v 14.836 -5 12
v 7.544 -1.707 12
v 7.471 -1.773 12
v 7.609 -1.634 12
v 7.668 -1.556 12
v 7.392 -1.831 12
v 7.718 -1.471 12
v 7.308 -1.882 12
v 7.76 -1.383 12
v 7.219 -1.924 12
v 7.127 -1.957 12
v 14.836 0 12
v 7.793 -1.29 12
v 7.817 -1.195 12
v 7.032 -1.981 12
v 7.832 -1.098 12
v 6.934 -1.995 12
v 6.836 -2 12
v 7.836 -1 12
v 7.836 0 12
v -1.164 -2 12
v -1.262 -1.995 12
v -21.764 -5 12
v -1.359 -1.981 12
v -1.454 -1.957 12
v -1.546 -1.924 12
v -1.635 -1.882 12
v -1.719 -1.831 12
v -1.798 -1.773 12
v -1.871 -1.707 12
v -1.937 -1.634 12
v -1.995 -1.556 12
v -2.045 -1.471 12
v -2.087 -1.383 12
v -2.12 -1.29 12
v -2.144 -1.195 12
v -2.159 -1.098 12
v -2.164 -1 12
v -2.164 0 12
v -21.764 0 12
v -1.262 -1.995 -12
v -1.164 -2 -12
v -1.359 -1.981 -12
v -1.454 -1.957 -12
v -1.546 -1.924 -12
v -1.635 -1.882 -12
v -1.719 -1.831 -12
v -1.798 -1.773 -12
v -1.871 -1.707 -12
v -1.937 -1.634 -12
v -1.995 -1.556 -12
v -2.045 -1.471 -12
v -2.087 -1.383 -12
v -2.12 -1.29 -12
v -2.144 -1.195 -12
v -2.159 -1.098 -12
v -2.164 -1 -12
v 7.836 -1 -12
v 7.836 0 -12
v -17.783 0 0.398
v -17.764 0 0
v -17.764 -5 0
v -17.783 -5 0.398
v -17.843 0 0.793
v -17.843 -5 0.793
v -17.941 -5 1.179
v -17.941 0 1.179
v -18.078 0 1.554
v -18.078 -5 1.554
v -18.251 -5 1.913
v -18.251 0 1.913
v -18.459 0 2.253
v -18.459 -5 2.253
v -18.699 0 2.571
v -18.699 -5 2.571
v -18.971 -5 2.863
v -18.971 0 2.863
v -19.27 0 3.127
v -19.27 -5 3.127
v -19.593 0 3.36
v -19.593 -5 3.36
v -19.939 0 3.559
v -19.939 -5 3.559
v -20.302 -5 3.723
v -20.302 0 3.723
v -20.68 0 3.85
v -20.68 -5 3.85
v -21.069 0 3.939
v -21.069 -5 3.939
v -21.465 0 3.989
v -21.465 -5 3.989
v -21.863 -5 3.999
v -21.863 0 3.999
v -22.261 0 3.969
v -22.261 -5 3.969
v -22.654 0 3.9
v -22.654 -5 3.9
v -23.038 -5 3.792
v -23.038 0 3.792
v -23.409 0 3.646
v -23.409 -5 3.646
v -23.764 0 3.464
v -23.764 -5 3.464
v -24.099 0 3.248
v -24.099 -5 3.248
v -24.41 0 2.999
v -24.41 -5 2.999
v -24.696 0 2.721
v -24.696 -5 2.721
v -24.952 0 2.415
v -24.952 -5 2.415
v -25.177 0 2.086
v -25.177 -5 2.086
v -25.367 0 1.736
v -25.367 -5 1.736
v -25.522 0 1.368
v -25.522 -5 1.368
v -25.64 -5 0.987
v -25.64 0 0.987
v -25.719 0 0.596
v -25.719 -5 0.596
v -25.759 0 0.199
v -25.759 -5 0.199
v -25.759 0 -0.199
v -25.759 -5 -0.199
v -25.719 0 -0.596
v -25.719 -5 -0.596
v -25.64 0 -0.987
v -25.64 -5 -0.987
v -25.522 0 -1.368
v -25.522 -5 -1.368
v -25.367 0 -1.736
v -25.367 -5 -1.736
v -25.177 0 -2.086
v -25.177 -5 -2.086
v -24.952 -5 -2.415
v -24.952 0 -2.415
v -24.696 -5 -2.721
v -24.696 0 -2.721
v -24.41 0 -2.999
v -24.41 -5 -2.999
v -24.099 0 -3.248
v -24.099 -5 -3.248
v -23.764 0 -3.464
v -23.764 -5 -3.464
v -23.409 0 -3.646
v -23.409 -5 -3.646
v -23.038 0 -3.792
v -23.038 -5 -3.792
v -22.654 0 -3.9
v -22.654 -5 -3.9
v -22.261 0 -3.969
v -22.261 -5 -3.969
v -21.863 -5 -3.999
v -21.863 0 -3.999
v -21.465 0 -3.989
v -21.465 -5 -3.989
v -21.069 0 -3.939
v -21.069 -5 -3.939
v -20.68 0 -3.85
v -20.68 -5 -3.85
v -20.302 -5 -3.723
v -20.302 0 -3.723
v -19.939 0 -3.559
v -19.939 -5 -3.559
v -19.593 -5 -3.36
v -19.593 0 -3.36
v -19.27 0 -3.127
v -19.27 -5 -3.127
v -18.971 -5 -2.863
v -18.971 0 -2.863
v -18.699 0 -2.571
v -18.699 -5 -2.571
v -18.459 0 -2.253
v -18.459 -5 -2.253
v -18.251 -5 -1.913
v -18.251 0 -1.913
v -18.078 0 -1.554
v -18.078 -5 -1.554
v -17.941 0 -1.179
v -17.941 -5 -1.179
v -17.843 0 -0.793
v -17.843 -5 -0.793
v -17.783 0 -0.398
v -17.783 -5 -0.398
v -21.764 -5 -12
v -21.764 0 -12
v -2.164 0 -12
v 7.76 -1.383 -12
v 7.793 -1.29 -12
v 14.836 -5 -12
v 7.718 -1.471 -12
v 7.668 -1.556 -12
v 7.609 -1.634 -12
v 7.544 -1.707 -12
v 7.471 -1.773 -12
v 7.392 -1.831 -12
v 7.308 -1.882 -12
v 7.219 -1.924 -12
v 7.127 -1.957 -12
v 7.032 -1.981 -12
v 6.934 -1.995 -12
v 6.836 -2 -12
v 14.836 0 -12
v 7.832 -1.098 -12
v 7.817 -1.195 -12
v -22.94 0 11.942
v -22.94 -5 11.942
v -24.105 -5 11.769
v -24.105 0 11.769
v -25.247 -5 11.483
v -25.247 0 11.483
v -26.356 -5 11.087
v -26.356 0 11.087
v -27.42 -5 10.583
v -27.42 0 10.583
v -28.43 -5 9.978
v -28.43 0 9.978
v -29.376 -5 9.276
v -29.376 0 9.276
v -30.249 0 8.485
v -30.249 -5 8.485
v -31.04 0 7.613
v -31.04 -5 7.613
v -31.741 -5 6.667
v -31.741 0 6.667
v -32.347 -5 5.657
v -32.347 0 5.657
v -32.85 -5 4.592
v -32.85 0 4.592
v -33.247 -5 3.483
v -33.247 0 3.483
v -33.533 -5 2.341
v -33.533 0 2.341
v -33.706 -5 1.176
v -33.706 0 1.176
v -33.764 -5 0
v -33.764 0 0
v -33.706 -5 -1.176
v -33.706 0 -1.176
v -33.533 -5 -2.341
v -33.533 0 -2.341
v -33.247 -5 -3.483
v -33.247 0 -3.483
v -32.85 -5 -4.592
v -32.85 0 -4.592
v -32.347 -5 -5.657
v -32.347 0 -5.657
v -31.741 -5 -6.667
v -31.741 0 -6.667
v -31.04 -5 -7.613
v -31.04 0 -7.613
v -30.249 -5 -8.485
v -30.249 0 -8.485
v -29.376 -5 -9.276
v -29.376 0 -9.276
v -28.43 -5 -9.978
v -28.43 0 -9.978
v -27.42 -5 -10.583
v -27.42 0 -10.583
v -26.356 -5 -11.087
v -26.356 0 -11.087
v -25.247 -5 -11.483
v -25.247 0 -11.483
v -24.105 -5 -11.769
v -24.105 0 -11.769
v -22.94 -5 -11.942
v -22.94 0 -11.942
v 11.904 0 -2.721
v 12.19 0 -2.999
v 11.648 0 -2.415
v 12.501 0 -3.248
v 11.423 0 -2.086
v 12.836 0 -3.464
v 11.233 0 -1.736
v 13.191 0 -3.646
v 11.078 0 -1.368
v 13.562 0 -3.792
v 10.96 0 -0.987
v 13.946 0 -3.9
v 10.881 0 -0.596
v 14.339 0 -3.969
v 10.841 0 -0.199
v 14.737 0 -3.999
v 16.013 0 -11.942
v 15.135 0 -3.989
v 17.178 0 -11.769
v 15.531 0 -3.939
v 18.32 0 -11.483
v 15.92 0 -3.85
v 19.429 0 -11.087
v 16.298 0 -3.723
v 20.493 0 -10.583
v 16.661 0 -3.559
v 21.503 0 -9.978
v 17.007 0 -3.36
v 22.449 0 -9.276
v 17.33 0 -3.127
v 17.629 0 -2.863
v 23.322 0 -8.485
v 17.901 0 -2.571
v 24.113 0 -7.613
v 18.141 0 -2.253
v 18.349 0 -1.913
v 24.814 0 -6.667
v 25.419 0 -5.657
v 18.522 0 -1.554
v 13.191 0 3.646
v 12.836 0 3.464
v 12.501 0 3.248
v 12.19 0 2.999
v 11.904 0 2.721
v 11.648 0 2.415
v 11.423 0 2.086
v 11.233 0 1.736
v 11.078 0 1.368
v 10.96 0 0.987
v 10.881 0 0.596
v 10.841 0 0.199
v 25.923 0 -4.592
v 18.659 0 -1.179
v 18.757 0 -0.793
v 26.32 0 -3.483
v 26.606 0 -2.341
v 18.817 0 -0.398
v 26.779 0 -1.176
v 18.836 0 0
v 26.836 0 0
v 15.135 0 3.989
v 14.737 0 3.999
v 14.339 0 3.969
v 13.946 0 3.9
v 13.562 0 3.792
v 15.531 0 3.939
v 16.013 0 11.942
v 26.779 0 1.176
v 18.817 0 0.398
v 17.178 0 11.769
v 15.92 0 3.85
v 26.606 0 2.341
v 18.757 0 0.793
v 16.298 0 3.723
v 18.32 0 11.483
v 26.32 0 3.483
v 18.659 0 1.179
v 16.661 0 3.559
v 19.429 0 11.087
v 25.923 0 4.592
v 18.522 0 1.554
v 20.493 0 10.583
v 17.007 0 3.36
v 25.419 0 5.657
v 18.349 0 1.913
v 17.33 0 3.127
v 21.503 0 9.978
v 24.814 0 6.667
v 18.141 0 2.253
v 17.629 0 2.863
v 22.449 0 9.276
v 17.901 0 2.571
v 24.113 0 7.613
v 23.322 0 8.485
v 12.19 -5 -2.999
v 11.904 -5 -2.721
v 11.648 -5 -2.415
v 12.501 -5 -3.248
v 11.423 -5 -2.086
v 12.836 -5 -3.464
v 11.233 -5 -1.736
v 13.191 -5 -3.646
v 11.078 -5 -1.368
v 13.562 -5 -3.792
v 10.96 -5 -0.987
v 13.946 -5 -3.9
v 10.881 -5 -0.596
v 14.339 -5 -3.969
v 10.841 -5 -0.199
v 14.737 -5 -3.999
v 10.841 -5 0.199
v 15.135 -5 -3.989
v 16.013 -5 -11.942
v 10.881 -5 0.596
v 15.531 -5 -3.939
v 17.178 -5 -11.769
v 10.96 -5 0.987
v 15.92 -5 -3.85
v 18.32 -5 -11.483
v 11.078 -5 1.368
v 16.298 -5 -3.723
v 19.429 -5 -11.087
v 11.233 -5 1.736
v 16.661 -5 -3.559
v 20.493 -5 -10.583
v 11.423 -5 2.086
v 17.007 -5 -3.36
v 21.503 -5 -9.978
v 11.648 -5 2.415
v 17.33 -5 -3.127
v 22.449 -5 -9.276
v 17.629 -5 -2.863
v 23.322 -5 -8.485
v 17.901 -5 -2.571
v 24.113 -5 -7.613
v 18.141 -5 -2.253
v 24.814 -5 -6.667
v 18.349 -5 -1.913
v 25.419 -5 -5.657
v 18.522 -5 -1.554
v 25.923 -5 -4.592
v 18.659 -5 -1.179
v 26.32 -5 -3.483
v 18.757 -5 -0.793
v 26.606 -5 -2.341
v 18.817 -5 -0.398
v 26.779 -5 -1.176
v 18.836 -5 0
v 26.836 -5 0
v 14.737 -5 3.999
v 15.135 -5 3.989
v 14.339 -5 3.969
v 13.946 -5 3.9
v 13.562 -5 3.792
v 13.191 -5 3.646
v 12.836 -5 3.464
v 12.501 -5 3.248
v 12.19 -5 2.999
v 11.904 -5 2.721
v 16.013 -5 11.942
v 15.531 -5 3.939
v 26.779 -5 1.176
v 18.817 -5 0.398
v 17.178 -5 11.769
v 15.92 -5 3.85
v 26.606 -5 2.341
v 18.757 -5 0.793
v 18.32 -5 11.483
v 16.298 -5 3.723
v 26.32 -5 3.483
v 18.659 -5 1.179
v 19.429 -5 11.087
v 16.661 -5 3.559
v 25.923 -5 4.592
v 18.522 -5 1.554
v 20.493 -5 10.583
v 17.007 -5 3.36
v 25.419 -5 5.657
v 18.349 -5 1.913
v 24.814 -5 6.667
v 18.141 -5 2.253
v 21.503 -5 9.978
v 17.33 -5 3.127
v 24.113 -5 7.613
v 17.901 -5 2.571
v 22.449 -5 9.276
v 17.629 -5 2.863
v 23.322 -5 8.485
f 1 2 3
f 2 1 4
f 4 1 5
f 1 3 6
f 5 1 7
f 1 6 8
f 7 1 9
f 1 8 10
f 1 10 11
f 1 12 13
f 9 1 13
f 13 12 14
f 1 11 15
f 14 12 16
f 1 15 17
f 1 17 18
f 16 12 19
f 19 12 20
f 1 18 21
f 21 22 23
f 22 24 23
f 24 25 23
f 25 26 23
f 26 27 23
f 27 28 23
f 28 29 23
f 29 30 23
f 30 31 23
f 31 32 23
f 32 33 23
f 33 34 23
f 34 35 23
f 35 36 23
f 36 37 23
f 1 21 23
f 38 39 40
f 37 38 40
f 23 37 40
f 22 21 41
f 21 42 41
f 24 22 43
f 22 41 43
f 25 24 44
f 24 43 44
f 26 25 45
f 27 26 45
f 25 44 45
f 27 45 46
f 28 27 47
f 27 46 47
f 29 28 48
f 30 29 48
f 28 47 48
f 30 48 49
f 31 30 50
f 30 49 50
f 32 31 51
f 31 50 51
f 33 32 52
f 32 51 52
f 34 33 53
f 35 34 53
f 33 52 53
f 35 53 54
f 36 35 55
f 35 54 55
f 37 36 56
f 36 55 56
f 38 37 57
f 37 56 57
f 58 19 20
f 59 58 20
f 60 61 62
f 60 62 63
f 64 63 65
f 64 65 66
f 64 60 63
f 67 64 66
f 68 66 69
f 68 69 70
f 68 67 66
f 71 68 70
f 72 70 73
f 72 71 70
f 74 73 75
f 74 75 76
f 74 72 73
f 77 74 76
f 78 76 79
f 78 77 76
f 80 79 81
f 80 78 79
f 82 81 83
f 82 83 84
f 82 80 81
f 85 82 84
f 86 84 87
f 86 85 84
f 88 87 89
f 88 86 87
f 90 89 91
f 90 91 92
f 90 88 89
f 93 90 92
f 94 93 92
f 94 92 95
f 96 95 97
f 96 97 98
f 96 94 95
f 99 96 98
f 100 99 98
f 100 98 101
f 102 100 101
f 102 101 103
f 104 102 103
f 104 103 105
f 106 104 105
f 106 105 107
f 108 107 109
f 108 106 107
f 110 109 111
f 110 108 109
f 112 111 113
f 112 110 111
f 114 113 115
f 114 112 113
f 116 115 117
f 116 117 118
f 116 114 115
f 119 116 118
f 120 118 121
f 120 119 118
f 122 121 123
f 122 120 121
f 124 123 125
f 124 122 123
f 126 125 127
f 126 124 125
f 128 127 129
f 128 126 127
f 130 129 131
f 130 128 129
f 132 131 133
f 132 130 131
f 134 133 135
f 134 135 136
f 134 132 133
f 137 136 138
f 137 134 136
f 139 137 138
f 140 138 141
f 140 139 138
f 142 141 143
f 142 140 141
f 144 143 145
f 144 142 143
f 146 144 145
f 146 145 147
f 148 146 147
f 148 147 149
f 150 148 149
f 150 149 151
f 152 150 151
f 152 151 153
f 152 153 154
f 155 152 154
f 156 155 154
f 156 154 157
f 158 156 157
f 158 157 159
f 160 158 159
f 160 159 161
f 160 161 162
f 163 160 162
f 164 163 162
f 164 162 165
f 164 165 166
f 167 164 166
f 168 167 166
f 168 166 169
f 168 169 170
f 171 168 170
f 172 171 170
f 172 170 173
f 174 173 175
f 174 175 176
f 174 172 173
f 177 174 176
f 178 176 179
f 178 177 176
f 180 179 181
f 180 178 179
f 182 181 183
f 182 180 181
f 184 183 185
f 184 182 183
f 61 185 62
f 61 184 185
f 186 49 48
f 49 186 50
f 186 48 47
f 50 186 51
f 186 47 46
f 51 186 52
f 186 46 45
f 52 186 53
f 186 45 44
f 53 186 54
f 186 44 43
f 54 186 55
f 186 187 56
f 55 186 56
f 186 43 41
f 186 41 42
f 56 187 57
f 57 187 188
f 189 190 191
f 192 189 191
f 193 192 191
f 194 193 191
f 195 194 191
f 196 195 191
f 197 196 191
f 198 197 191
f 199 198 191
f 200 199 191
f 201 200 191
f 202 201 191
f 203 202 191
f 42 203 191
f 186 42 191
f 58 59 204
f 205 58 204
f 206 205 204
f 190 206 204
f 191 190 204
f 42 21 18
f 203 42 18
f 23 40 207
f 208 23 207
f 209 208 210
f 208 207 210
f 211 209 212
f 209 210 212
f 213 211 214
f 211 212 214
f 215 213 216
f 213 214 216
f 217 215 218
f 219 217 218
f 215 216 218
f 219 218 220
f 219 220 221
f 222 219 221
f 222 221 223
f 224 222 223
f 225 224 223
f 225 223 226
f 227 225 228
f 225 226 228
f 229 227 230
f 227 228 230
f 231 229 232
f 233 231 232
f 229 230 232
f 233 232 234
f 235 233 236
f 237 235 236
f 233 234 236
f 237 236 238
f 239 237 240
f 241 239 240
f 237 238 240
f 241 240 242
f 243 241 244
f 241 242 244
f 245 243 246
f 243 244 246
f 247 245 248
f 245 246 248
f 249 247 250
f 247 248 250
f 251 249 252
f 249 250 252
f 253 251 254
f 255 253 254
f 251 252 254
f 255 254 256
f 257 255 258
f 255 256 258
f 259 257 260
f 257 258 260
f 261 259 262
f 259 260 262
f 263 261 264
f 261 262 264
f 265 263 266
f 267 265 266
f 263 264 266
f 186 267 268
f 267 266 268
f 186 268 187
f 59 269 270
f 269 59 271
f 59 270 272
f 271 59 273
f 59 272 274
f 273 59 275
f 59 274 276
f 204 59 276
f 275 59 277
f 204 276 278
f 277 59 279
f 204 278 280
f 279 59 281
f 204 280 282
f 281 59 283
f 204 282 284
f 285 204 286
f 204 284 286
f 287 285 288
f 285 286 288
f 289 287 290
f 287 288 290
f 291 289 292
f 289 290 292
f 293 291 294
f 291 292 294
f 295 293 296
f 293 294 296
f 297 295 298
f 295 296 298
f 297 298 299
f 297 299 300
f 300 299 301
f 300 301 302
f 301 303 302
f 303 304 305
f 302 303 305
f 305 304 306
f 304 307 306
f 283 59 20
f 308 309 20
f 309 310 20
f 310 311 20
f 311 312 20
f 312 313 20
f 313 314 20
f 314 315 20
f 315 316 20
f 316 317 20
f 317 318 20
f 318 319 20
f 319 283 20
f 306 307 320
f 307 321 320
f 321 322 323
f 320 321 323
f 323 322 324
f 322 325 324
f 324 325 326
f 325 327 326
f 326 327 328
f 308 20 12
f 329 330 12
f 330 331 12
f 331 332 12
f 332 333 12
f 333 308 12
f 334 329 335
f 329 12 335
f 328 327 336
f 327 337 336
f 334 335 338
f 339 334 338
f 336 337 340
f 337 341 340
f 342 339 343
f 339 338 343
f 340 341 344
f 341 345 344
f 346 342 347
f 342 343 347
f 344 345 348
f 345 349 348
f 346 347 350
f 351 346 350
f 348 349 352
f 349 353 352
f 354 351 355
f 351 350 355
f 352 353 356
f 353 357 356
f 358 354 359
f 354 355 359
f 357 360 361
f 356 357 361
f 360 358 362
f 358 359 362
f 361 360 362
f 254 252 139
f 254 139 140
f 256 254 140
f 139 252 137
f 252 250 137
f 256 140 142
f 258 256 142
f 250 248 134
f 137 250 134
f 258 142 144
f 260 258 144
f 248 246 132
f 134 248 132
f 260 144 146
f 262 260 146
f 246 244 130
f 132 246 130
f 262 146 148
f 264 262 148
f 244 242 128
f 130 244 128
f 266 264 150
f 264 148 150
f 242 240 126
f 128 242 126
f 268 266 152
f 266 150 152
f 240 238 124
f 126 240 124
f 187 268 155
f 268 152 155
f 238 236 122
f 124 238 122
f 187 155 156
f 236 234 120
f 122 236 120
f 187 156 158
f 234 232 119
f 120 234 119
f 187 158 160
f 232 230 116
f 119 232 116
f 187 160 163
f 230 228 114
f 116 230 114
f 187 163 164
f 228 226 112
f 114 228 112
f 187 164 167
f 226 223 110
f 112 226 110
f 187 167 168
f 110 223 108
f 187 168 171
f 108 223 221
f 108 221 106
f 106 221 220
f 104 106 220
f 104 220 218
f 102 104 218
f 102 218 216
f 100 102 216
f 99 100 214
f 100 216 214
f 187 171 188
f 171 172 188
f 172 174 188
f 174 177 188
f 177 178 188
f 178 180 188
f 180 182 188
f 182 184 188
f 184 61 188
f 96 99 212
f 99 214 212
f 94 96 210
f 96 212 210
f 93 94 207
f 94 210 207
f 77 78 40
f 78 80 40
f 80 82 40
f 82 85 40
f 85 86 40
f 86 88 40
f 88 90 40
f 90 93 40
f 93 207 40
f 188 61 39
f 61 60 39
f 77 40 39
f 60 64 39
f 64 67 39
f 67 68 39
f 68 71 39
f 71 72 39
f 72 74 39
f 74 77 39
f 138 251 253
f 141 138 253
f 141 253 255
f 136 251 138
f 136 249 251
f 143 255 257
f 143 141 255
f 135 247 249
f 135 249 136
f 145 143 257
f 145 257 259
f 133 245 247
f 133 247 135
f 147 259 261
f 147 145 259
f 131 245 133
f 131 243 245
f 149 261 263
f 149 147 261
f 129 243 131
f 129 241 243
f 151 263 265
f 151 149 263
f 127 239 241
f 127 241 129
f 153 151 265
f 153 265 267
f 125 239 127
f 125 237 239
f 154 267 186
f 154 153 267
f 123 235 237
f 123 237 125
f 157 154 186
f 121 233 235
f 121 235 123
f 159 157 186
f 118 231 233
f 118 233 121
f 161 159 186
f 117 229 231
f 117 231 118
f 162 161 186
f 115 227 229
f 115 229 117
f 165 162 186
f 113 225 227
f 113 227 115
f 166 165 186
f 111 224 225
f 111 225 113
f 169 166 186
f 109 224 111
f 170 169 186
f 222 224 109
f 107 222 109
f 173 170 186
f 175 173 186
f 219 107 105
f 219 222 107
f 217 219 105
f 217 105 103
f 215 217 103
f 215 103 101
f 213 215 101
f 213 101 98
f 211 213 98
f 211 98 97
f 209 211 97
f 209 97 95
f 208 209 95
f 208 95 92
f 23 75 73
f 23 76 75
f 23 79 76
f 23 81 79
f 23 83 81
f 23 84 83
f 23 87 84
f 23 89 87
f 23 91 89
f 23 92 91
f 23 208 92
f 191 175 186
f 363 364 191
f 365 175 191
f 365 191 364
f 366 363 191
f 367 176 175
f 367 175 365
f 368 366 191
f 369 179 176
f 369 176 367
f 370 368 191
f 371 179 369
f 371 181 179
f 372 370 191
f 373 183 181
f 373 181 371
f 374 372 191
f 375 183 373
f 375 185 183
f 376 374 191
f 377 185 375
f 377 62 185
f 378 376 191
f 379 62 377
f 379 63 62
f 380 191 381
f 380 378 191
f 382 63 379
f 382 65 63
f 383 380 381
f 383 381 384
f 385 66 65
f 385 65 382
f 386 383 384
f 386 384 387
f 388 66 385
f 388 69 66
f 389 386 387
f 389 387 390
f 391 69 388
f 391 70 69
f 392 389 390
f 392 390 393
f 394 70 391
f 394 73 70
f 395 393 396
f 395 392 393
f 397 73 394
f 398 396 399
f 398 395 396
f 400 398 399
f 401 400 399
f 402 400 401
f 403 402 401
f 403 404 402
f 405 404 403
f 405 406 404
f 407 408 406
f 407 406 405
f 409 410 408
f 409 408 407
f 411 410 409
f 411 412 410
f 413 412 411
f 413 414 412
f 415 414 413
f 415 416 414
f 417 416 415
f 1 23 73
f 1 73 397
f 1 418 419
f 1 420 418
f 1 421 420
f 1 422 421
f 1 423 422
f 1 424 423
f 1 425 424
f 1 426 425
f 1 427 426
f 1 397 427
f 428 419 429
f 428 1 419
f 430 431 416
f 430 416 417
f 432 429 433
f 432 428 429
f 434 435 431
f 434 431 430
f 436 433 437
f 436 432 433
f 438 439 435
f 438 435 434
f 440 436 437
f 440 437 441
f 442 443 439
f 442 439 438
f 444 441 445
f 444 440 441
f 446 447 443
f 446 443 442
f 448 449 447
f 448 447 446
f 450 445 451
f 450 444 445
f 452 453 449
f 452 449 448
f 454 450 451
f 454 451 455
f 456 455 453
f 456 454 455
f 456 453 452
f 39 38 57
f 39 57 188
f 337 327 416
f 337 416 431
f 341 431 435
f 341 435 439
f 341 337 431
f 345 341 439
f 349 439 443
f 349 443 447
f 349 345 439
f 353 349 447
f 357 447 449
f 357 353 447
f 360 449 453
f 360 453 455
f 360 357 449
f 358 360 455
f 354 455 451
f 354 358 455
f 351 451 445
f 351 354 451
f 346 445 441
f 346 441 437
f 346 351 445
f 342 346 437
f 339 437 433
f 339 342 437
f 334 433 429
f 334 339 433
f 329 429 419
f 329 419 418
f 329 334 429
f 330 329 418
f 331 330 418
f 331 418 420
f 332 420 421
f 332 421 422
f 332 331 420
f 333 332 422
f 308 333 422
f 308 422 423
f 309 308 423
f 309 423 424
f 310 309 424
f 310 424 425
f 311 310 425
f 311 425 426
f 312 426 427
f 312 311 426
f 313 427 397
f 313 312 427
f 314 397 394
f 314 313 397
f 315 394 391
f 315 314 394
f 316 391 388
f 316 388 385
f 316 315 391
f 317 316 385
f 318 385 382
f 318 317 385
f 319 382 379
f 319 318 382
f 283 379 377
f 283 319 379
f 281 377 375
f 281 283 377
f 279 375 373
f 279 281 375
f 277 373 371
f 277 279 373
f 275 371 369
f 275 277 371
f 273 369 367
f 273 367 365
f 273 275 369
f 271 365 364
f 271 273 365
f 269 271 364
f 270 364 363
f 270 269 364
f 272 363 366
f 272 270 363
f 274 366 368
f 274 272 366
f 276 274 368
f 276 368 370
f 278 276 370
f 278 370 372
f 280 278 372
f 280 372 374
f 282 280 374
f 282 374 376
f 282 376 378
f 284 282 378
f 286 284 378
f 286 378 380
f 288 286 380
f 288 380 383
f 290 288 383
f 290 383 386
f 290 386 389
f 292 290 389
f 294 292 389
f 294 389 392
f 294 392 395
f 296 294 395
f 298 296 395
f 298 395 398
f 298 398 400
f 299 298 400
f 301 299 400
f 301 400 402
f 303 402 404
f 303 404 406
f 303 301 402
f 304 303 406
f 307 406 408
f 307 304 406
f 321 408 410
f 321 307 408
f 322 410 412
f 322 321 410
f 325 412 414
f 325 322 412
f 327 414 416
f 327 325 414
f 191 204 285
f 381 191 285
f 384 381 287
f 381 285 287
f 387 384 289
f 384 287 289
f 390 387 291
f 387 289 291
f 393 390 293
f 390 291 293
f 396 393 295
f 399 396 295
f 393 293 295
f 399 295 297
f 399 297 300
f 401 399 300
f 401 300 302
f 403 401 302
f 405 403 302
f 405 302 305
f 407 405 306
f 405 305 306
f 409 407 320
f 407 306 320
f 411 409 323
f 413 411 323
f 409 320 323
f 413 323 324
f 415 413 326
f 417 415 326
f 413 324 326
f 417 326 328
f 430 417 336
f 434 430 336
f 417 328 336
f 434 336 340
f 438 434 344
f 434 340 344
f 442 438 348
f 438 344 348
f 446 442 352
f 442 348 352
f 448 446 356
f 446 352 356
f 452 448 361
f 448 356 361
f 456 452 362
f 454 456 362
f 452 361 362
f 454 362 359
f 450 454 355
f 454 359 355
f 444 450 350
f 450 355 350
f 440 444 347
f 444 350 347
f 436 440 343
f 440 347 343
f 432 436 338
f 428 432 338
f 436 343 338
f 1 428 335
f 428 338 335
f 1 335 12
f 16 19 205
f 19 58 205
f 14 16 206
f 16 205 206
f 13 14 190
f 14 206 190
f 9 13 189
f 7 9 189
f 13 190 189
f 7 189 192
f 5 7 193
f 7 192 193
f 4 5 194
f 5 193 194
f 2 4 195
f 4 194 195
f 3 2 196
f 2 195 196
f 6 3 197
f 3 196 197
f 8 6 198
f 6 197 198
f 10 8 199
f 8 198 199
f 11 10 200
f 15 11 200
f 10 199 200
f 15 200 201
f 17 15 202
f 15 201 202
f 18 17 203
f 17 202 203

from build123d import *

# Parameters (mm, degrees)
F0_R     = 4
F1_DEPTH = 5
F2_W     = 10
F2_H     = 2
F3_DEPTH = 24.001
F4_R     = 1


with BuildPart() as f1:
    # F0 (on Front) → F1 (new body)
    with BuildSketch(Plane.XZ):
        with BuildLine():
            Line((14.836441, 12), (-21.763559, 12))
            ThreePointArc((-21.763559, 12), (-33.763559, 0), (-21.763559, -12))
            Line((-21.763559, -12), (14.836441, -12))
            ThreePointArc((14.836441, -12), (26.836441, 0), (14.836441, 12))
        make_face()
        with Locations((-21.763559, 0)):
            Circle(F0_R, mode=Mode.SUBTRACT)
        with Locations((14.836441, 0)):
            Circle(F0_R, mode=Mode.SUBTRACT)
    extrude(amount=F1_DEPTH)

    # F2 (on face) → F3 (cut, through all)
    with BuildSketch(Plane.XY.offset(12)):
        with Locations((2.836441, -1)):
            Rectangle(F2_W, F2_H)
    extrude(amount=-F3_DEPTH, mode=Mode.SUBTRACT)

    # F4
    f4_edges = [f1.edges().sort_by_distance(p)[0] for p in [
        (7.836441, -2, 0),
        (-2.163559, -2, 0),
    ]]
    fillet(f4_edges, radius=F4_R)


solid = f1.part
